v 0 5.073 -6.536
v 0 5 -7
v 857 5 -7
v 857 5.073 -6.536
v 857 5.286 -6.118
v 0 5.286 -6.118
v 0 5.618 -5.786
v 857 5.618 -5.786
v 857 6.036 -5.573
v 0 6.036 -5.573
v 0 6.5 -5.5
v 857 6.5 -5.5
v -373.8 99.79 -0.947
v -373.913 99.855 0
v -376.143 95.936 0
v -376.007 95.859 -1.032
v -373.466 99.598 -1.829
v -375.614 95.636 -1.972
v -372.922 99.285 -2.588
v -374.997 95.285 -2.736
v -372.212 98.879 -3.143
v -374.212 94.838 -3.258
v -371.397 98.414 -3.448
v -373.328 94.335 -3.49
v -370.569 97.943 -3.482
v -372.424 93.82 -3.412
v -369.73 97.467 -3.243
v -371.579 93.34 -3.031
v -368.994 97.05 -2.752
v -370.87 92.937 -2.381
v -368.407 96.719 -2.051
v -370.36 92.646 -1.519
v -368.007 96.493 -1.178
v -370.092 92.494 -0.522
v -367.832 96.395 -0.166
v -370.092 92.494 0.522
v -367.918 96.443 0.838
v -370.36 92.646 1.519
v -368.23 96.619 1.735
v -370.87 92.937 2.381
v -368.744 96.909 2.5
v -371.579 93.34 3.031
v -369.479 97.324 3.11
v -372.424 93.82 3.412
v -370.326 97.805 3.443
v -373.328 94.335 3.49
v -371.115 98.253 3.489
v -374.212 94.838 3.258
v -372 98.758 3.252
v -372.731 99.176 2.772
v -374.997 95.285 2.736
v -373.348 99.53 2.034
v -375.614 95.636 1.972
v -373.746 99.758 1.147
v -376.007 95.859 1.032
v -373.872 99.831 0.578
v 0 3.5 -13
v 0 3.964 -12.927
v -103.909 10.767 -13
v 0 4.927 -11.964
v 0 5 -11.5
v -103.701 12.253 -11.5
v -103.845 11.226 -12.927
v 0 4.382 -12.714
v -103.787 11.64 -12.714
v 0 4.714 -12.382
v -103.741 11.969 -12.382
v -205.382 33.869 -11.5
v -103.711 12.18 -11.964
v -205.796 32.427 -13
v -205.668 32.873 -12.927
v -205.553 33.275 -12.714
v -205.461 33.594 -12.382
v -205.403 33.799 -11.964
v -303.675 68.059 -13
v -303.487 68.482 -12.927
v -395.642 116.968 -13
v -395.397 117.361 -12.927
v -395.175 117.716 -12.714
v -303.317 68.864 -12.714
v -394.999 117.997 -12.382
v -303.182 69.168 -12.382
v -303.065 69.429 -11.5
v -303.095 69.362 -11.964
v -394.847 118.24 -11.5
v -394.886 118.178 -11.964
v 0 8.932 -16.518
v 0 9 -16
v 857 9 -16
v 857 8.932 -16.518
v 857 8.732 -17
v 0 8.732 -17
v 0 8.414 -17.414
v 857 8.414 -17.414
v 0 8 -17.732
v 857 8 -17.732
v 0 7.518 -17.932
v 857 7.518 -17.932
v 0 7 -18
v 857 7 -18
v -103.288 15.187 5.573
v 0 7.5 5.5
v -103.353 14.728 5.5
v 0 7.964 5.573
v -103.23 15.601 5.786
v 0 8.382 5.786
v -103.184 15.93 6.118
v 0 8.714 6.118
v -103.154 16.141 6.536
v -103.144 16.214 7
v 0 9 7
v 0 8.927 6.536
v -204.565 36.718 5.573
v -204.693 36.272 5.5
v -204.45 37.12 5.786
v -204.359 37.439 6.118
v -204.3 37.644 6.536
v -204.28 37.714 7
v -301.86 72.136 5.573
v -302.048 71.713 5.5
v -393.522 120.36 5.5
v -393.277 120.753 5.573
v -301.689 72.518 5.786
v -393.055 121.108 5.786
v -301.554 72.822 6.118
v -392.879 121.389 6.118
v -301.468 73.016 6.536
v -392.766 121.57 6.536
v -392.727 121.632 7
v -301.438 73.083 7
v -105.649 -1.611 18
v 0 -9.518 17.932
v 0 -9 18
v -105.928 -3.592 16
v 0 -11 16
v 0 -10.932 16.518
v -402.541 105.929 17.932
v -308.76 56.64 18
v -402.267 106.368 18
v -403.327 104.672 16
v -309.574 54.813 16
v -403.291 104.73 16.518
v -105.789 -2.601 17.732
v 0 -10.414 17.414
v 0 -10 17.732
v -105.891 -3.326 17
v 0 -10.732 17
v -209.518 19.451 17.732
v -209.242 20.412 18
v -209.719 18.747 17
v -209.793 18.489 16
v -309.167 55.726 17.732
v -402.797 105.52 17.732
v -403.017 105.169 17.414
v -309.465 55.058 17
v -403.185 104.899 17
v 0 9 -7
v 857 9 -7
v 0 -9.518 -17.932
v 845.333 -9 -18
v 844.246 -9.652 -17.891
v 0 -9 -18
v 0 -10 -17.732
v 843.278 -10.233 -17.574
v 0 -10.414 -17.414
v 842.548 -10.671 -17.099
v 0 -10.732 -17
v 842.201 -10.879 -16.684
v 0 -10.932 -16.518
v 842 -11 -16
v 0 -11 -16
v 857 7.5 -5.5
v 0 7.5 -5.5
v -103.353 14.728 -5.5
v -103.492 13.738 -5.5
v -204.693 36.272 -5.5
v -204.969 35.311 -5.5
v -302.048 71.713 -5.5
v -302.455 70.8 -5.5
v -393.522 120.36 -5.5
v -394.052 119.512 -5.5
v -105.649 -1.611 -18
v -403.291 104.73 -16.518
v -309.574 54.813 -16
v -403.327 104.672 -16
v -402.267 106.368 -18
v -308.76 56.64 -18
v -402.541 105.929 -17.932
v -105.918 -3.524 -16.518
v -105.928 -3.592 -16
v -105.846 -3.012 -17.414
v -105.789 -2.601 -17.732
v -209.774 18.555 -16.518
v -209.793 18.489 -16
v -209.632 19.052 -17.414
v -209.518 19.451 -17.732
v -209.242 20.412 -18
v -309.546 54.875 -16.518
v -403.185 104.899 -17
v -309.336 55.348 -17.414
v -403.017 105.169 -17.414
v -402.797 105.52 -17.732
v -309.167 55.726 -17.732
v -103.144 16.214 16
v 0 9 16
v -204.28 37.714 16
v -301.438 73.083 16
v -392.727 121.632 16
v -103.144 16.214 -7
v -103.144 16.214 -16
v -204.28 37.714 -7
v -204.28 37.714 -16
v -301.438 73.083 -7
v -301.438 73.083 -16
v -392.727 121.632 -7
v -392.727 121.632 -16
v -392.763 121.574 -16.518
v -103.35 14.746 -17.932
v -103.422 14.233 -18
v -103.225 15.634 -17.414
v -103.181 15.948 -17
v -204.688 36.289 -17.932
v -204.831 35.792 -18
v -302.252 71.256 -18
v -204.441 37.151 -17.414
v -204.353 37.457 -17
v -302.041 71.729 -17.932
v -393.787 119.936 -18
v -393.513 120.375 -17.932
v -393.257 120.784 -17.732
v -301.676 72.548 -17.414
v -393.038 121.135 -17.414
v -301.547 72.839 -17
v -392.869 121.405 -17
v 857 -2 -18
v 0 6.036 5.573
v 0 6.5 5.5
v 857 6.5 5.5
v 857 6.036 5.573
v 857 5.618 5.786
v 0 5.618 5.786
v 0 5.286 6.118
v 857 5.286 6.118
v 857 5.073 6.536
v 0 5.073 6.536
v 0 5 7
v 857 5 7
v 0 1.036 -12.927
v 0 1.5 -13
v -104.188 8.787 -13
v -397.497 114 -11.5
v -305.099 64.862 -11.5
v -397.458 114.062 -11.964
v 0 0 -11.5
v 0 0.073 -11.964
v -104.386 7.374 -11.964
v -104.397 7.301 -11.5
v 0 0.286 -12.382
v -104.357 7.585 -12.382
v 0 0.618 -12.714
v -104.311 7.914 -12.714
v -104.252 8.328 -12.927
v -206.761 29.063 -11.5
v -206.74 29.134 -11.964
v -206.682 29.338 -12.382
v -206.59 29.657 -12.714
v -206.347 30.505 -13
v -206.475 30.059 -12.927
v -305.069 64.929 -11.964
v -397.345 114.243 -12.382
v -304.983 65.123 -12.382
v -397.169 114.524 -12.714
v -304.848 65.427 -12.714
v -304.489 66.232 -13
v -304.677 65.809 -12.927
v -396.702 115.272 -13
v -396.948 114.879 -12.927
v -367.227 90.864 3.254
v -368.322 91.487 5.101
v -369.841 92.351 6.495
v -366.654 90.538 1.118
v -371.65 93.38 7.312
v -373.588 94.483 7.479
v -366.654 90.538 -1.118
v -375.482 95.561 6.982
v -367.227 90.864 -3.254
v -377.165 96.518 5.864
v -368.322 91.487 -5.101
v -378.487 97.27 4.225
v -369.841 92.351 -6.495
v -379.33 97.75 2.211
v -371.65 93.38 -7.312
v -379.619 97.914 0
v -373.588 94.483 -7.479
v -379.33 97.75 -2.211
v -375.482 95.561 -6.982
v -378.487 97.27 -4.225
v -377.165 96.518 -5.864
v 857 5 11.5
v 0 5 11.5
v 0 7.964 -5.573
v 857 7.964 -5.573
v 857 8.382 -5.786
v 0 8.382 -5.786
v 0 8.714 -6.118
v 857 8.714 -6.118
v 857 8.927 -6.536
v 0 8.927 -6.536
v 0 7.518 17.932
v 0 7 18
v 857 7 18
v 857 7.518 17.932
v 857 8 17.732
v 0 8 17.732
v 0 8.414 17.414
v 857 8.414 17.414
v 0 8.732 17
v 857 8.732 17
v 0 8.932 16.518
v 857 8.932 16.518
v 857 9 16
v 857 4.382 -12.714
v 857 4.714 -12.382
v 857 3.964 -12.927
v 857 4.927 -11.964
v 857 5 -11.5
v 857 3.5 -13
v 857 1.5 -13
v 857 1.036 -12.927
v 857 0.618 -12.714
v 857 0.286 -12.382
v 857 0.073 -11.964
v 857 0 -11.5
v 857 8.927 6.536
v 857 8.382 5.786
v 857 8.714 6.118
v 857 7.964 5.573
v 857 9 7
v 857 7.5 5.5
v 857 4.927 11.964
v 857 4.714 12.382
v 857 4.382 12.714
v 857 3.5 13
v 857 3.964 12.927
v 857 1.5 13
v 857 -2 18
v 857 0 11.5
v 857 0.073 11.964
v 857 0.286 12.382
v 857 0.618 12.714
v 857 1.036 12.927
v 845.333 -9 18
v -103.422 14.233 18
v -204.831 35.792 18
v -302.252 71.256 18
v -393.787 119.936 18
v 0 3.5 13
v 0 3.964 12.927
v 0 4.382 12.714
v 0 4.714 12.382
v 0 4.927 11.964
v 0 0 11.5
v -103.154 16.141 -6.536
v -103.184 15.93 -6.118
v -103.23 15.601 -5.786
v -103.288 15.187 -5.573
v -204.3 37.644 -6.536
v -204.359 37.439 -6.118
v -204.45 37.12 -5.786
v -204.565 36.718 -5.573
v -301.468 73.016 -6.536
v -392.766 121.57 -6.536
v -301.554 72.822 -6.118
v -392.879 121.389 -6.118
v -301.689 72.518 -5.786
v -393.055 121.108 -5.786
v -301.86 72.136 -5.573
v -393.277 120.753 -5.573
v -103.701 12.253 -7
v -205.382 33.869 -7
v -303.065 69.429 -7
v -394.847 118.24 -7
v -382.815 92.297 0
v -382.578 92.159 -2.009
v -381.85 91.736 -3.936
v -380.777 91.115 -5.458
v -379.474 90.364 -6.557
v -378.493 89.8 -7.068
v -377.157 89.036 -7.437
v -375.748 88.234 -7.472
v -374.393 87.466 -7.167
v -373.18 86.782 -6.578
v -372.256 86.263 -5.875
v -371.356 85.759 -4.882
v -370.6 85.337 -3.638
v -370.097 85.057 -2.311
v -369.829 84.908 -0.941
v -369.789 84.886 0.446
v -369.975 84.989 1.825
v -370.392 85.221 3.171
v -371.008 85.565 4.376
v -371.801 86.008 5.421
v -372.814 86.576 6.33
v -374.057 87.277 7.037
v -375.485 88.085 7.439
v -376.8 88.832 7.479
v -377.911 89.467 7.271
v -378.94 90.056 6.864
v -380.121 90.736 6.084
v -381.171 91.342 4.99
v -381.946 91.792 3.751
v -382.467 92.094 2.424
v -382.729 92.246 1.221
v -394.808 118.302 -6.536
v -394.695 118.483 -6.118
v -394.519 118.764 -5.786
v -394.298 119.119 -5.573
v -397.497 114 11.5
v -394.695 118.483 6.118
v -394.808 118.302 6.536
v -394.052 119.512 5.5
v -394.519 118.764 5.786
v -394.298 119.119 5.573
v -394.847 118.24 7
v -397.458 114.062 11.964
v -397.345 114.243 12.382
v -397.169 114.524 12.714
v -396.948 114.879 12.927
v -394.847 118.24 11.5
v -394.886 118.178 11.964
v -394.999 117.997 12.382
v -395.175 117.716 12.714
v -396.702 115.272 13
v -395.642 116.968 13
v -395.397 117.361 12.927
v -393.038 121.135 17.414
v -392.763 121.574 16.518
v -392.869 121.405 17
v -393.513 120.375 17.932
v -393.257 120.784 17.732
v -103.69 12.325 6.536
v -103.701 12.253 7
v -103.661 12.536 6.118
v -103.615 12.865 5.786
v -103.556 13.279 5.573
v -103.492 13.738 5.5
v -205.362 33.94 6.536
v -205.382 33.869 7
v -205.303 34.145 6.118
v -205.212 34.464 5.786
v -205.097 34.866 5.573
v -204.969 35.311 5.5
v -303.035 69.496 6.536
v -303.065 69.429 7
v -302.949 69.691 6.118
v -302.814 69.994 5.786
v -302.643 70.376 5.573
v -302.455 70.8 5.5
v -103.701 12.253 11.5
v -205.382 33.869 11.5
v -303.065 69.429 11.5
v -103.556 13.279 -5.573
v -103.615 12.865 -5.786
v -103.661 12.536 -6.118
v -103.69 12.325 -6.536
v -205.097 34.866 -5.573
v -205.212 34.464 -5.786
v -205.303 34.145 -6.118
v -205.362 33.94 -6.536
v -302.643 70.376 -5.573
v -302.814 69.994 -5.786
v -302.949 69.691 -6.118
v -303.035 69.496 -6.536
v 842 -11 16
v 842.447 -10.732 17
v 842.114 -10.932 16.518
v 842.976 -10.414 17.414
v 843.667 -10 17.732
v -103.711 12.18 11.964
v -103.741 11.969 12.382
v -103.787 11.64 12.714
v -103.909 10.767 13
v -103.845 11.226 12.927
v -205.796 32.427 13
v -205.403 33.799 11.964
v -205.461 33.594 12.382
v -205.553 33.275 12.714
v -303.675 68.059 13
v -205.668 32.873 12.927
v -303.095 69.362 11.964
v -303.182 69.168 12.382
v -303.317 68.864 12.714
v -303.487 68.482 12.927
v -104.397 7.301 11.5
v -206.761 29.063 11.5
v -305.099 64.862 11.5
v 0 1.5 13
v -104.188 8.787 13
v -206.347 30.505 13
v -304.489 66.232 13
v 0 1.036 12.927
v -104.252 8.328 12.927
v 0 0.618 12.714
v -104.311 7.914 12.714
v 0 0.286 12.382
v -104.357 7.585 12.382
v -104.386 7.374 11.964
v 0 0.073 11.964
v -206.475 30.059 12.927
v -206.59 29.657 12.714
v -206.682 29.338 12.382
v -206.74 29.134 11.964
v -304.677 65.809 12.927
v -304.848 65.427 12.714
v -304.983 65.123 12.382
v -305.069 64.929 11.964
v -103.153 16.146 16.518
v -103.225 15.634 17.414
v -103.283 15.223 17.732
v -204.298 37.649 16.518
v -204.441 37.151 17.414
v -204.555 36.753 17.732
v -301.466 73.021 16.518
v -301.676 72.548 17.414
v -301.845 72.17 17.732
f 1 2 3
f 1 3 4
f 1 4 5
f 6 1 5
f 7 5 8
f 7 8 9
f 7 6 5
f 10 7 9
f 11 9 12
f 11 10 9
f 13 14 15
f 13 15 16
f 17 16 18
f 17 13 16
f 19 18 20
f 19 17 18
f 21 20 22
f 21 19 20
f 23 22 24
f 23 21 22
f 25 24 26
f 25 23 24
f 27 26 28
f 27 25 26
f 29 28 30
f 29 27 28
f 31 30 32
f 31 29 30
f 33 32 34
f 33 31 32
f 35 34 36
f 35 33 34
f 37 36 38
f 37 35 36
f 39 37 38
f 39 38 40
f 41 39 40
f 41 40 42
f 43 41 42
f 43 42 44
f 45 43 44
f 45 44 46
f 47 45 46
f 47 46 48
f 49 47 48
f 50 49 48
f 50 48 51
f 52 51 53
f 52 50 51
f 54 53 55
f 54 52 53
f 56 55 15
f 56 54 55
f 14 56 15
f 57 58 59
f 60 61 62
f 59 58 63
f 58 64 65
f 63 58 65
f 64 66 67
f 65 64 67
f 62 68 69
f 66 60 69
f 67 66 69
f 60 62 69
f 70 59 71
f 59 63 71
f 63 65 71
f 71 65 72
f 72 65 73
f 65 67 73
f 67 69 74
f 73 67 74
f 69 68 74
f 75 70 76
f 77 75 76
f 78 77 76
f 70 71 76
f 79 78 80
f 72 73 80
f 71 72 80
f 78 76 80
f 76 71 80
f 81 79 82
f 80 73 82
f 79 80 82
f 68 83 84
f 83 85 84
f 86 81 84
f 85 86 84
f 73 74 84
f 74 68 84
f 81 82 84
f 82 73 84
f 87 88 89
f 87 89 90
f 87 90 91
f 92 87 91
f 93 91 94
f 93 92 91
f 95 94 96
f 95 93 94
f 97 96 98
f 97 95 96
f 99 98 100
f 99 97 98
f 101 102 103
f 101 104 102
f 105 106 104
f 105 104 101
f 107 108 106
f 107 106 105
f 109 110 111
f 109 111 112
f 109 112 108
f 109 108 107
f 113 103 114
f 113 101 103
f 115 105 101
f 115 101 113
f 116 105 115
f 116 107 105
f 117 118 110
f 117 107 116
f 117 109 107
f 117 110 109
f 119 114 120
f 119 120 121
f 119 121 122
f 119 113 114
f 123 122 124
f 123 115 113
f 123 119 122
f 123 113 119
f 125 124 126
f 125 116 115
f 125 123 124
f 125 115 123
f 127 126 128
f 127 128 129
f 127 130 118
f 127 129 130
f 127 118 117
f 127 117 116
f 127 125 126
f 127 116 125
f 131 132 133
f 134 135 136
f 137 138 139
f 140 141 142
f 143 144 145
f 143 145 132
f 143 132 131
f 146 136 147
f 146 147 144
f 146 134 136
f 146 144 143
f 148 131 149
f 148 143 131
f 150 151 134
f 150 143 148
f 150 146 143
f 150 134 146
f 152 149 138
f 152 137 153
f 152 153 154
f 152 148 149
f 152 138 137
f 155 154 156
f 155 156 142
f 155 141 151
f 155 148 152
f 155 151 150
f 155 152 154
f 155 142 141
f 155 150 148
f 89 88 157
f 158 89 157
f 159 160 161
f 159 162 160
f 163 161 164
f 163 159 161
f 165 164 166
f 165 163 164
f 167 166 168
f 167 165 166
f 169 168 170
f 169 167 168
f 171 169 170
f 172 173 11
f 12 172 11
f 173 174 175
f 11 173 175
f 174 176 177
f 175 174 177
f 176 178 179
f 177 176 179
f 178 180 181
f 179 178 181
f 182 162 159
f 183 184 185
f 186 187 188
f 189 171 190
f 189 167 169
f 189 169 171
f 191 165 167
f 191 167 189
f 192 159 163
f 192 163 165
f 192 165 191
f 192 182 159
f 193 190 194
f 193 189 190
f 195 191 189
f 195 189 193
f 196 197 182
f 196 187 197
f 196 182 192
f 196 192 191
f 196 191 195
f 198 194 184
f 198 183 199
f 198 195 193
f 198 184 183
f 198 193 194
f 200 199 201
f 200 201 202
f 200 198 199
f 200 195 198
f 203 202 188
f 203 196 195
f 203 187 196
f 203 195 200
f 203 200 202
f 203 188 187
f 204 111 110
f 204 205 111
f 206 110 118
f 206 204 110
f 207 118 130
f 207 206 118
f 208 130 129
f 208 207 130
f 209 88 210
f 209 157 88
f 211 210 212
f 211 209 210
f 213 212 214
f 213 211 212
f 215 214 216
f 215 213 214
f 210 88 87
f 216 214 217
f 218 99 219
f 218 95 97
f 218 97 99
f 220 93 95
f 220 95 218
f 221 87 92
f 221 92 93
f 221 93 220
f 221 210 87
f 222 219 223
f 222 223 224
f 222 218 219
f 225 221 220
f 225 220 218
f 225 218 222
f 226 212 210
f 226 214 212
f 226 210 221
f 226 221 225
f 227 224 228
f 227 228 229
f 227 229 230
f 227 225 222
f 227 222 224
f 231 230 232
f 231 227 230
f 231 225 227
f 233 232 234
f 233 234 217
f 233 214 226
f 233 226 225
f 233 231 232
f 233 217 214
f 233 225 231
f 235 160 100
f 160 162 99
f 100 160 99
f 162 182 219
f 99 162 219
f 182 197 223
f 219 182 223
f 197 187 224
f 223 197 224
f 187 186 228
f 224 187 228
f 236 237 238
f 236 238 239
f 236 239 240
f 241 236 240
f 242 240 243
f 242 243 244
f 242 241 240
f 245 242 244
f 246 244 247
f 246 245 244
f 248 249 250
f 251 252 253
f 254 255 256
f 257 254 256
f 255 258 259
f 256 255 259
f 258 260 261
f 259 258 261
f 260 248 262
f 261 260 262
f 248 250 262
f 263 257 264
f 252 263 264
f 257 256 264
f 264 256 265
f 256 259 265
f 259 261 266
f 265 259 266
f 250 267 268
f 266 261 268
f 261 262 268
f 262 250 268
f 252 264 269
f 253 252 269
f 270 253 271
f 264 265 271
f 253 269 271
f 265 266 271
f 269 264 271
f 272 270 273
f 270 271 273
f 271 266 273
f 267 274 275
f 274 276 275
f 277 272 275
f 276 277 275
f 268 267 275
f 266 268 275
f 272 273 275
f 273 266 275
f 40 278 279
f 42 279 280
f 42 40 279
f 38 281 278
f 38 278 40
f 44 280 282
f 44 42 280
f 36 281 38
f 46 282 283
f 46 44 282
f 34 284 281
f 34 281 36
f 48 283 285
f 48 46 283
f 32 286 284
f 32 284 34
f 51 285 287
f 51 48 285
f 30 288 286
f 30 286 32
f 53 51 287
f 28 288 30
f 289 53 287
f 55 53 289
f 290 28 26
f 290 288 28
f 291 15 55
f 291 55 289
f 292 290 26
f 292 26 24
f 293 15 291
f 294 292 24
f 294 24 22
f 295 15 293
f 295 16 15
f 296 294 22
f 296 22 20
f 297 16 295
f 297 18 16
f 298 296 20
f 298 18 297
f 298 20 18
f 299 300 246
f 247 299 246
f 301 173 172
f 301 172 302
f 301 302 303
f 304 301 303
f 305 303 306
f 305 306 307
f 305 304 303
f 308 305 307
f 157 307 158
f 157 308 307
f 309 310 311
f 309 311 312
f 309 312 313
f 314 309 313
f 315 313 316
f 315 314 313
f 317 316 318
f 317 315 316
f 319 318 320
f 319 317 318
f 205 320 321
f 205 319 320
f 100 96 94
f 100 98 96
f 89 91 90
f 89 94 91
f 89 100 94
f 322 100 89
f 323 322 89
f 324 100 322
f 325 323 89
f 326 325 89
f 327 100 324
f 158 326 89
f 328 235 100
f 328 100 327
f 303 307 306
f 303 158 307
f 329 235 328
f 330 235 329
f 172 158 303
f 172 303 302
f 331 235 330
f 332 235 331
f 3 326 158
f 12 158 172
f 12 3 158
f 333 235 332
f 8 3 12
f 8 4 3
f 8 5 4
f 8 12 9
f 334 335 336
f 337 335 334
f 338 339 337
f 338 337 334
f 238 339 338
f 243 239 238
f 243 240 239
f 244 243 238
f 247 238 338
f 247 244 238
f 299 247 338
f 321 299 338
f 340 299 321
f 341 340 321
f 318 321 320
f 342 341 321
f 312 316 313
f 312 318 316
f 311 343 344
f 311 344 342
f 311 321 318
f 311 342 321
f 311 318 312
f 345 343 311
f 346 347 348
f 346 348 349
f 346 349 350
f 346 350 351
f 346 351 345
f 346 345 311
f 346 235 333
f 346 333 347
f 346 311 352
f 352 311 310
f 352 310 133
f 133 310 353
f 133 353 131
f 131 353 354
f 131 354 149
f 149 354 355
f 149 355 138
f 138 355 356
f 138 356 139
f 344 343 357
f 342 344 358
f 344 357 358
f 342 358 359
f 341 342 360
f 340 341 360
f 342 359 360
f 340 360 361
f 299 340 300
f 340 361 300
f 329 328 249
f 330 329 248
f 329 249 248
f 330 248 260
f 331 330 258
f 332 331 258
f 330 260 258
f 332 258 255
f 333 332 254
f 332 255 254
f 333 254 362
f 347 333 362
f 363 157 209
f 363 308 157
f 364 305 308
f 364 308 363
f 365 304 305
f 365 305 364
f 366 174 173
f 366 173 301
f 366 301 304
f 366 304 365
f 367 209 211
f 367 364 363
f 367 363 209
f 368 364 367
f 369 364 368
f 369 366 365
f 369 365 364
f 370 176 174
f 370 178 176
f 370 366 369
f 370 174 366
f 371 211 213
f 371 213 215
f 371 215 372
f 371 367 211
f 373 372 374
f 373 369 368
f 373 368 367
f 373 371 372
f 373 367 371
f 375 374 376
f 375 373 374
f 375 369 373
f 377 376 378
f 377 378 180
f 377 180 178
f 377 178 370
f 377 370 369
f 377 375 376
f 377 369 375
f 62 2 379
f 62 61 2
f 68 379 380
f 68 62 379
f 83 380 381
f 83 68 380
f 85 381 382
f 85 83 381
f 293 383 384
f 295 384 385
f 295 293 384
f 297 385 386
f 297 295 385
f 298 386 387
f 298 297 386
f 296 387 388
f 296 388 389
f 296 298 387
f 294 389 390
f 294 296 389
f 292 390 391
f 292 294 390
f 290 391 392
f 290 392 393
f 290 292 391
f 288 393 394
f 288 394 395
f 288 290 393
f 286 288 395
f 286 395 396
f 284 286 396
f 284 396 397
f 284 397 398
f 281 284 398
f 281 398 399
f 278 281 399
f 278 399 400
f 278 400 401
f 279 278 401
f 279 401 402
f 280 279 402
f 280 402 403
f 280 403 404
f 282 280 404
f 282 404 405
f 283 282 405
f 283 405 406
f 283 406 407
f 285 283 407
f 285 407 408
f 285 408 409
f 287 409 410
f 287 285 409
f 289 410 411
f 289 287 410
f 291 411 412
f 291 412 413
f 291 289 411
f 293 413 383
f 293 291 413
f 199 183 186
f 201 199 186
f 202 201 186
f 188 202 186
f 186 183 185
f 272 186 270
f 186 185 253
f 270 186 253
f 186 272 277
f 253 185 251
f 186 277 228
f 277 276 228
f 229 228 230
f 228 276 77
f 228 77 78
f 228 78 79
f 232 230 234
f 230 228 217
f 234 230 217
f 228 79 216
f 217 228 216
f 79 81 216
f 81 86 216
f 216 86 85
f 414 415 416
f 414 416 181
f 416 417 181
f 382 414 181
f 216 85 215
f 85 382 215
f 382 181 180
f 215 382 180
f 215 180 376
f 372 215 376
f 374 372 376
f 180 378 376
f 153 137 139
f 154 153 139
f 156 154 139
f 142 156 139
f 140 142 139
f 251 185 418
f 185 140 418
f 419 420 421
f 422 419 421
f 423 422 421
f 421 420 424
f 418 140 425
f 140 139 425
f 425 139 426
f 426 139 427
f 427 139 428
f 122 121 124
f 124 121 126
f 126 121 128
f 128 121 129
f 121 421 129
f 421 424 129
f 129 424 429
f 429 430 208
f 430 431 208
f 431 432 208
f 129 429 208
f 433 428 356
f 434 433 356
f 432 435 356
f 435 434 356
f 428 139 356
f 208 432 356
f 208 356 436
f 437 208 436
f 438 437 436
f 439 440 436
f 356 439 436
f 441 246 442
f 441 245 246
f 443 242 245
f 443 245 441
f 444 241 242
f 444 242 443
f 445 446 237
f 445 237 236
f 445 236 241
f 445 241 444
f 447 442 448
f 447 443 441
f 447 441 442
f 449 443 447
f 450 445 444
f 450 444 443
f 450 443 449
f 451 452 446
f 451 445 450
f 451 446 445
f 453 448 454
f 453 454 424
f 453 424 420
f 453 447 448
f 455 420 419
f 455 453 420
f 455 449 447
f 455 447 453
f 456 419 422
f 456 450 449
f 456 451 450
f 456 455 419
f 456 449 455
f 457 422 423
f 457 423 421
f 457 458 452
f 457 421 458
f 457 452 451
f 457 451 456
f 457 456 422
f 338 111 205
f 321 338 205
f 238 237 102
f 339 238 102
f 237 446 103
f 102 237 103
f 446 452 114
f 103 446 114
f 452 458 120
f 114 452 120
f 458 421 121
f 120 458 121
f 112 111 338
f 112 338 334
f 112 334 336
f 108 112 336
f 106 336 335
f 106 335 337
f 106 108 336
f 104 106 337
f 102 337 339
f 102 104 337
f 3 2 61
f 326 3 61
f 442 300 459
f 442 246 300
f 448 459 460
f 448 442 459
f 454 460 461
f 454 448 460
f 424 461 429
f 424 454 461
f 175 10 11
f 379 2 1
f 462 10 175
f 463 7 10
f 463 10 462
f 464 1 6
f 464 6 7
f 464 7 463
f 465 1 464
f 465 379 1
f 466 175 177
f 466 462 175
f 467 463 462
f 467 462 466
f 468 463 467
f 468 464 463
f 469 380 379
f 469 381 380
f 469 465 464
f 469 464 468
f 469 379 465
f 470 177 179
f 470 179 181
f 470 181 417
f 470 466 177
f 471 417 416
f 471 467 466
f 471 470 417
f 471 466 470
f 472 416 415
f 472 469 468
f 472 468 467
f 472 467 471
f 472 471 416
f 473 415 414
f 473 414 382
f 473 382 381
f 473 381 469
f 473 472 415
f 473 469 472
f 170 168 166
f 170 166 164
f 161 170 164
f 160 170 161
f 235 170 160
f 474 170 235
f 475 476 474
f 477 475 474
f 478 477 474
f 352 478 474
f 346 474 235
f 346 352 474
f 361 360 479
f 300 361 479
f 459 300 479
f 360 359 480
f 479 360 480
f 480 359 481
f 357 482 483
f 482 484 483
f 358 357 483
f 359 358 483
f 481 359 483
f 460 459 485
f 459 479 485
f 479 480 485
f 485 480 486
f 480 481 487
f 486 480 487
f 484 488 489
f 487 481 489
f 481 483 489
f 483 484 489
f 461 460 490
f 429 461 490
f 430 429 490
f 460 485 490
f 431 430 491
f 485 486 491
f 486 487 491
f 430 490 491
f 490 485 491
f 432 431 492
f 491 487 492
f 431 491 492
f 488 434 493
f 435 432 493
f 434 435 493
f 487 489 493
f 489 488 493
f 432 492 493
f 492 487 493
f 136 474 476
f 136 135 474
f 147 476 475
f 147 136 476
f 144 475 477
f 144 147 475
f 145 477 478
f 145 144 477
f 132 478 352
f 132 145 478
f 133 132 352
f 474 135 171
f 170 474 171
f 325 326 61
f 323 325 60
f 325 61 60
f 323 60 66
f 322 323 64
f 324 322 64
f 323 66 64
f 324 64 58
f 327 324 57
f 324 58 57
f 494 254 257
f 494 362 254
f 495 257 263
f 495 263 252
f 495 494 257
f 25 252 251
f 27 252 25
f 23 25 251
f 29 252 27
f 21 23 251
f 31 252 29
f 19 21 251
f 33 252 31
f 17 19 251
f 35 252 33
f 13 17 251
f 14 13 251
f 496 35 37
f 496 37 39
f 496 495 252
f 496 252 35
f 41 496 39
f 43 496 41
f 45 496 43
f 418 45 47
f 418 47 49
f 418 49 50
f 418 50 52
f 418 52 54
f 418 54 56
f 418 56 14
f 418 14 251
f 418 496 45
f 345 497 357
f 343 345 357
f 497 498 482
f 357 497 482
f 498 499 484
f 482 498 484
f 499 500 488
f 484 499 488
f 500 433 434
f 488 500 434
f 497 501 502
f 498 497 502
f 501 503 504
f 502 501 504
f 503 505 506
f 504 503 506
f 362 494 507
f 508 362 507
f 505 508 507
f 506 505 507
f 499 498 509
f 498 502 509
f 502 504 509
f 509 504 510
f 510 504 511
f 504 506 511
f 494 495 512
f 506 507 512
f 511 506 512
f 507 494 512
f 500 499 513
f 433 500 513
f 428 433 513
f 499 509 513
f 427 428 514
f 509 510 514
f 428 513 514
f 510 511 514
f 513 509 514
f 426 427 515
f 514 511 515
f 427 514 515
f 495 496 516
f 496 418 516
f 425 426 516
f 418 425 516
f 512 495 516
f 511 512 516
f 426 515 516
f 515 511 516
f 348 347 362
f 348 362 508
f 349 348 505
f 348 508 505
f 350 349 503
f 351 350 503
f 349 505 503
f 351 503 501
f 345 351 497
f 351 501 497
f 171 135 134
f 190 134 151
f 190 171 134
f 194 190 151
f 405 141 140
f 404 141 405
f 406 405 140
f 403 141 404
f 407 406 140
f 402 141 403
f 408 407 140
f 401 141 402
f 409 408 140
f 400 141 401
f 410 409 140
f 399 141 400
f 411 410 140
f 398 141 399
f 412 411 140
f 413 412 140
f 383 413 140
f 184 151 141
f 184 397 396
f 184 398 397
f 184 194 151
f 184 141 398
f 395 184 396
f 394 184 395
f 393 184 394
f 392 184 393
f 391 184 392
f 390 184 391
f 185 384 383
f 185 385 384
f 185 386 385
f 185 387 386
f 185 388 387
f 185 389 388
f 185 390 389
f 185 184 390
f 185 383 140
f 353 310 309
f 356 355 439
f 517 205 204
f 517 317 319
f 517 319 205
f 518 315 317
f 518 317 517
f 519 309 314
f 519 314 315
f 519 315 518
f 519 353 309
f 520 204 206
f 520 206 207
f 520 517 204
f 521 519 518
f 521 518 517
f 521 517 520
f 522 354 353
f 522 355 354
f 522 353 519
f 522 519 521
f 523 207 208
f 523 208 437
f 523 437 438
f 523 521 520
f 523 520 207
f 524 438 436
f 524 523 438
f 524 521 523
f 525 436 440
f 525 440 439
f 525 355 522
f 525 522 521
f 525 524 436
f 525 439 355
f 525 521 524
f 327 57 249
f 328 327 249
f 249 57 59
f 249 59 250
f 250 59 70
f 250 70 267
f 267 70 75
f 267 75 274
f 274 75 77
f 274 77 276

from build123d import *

# Parameters (mm, degrees)
CHAMFER_1_SIZE           = 15
CHAMFER_1_SIZE_2         = 9
CUT_EXTRUDE_1_DEPTH      = 20
CUT_EXTRUDE_1_DEPTH_BACK = 20
SKETCH_3_R               = 3.5
SKETCH_4_R               = 7.5
CUT_EXTRUDE_2_DEPTH      = 10


with BuildPart() as part:
    # По траектории1: sweep along a path in Эскиз1
    with BuildLine(Plane.XY) as sweep_1_path:
        Line((857, 0), (0, 0))
        ThreePointArc((0, 0), (-206.760731281, 29.063109558), (-397.497169801, 114))
    # Эскиз2 → По траектории1 (sweep)
    with BuildSketch(Plane(origin=(857, 0, 0), x_dir=(0, 0, -1), z_dir=(1, 0, 0))):
        with BuildLine():
            Line((11.5, 0), (-11.5, 0))
            ThreePointArc((-11.5, 0), (-12.560660172, 0.439339828), (-13, 1.5))
            Line((-13, 1.5), (-13, 3.5))
            ThreePointArc((-13, 3.5), (-12.560660172, 4.560660172), (-11.5, 5))
            Line((-11.5, 5), (-7, 5))
            ThreePointArc((-7, 5), (-5.939339828, 5.439339828), (-5.5, 6.5))
            Line((-5.5, 6.5), (-5.5, 7.5))
            ThreePointArc((-5.5, 7.5), (-5.939339828, 8.560660172), (-7, 9))
            Line((-7, 9), (-16, 9))
            ThreePointArc((-16, 9), (-17.414213562, 8.414213562), (-18, 7))
            Line((-18, 7), (-18, -9))
            ThreePointArc((-18, -9), (-17.414213562, -10.414213562), (-16, -11))
            Line((-16, -11), (16, -11))
            ThreePointArc((16, -11), (17.414213562, -10.414213562), (18, -9))
            Line((18, -9), (18, 7))
            ThreePointArc((18, 7), (17.414213562, 8.414213562), (16, 9))
            Line((16, 9), (7, 9))
            ThreePointArc((7, 9), (5.939339828, 8.560660172), (5.5, 7.5))
            Line((5.5, 7.5), (5.5, 6.5))
            ThreePointArc((5.5, 6.5), (5.939339828, 5.439339828), (7, 5))
            Line((7, 5), (11.5, 5))
            ThreePointArc((11.5, 5), (12.560660172, 4.560660172), (13, 3.5))
            Line((13, 3.5), (13, 1.5))
            ThreePointArc((13, 1.5), (12.560660172, 0.439339828), (11.5, 0))
        make_face()
    sweep(path=sweep_1_path.line)

    # Фаска1
    # the kernel refuses this chamfer: 15, 9 mm, written as the material it takes off along each edge
    with BuildSketch(Plane(origin=(857, -11, 54.793916458), x_dir=(-0.9998021063601228, -0.019893418958582456, 0), z_dir=(0, 0, -1))) as chamfer_1_piece_1:
        Polygon((CHAMFER_1_SIZE * 0.99980210636, CHAMFER_1_SIZE * 0.0198934189586), (-CHAMFER_1_SIZE_2 * 0.0198934189586, CHAMFER_1_SIZE_2 * 0.99980210636), (0, 0), align=None)
    extrude(amount=109.587832916, mode=Mode.SUBTRACT)

    # Эскиз3 → Вырез-Вытянуть1 (cut, two sides: drawn at the far end of the back side and taken through both)
    with BuildSketch(Plane(origin=(-370.875233434, 98.116911382, 0), x_dir=(0.8691774514901227, -0.4945003112447307, 0), z_dir=(-0.4945003112447307, -0.8691774514901227, 0)).offset(-CUT_EXTRUDE_1_DEPTH_BACK)):
        with Locations(Location((0, 0, 0), (0, 0, 180))):
            Circle(SKETCH_3_R)
    extrude(amount=CUT_EXTRUDE_1_DEPTH + CUT_EXTRUDE_1_DEPTH_BACK, mode=Mode.SUBTRACT)

    # Эскиз4 → Вырез-Вытянуть2 (cut)
    with BuildSketch(Plane(origin=(-50.744094618, -89.192305515, 0), x_dir=(0.8691774514901226, -0.4945003112447307, 0), z_dir=(-0.4945003112447307, -0.8691774514901226, 0))):
        with Locations(Location((-370.875233434, 0, 0), (0, 0, 180))):
            Circle(SKETCH_4_R)
    extrude(amount=CUT_EXTRUDE_2_DEPTH, mode=Mode.SUBTRACT)


solid = part.part
